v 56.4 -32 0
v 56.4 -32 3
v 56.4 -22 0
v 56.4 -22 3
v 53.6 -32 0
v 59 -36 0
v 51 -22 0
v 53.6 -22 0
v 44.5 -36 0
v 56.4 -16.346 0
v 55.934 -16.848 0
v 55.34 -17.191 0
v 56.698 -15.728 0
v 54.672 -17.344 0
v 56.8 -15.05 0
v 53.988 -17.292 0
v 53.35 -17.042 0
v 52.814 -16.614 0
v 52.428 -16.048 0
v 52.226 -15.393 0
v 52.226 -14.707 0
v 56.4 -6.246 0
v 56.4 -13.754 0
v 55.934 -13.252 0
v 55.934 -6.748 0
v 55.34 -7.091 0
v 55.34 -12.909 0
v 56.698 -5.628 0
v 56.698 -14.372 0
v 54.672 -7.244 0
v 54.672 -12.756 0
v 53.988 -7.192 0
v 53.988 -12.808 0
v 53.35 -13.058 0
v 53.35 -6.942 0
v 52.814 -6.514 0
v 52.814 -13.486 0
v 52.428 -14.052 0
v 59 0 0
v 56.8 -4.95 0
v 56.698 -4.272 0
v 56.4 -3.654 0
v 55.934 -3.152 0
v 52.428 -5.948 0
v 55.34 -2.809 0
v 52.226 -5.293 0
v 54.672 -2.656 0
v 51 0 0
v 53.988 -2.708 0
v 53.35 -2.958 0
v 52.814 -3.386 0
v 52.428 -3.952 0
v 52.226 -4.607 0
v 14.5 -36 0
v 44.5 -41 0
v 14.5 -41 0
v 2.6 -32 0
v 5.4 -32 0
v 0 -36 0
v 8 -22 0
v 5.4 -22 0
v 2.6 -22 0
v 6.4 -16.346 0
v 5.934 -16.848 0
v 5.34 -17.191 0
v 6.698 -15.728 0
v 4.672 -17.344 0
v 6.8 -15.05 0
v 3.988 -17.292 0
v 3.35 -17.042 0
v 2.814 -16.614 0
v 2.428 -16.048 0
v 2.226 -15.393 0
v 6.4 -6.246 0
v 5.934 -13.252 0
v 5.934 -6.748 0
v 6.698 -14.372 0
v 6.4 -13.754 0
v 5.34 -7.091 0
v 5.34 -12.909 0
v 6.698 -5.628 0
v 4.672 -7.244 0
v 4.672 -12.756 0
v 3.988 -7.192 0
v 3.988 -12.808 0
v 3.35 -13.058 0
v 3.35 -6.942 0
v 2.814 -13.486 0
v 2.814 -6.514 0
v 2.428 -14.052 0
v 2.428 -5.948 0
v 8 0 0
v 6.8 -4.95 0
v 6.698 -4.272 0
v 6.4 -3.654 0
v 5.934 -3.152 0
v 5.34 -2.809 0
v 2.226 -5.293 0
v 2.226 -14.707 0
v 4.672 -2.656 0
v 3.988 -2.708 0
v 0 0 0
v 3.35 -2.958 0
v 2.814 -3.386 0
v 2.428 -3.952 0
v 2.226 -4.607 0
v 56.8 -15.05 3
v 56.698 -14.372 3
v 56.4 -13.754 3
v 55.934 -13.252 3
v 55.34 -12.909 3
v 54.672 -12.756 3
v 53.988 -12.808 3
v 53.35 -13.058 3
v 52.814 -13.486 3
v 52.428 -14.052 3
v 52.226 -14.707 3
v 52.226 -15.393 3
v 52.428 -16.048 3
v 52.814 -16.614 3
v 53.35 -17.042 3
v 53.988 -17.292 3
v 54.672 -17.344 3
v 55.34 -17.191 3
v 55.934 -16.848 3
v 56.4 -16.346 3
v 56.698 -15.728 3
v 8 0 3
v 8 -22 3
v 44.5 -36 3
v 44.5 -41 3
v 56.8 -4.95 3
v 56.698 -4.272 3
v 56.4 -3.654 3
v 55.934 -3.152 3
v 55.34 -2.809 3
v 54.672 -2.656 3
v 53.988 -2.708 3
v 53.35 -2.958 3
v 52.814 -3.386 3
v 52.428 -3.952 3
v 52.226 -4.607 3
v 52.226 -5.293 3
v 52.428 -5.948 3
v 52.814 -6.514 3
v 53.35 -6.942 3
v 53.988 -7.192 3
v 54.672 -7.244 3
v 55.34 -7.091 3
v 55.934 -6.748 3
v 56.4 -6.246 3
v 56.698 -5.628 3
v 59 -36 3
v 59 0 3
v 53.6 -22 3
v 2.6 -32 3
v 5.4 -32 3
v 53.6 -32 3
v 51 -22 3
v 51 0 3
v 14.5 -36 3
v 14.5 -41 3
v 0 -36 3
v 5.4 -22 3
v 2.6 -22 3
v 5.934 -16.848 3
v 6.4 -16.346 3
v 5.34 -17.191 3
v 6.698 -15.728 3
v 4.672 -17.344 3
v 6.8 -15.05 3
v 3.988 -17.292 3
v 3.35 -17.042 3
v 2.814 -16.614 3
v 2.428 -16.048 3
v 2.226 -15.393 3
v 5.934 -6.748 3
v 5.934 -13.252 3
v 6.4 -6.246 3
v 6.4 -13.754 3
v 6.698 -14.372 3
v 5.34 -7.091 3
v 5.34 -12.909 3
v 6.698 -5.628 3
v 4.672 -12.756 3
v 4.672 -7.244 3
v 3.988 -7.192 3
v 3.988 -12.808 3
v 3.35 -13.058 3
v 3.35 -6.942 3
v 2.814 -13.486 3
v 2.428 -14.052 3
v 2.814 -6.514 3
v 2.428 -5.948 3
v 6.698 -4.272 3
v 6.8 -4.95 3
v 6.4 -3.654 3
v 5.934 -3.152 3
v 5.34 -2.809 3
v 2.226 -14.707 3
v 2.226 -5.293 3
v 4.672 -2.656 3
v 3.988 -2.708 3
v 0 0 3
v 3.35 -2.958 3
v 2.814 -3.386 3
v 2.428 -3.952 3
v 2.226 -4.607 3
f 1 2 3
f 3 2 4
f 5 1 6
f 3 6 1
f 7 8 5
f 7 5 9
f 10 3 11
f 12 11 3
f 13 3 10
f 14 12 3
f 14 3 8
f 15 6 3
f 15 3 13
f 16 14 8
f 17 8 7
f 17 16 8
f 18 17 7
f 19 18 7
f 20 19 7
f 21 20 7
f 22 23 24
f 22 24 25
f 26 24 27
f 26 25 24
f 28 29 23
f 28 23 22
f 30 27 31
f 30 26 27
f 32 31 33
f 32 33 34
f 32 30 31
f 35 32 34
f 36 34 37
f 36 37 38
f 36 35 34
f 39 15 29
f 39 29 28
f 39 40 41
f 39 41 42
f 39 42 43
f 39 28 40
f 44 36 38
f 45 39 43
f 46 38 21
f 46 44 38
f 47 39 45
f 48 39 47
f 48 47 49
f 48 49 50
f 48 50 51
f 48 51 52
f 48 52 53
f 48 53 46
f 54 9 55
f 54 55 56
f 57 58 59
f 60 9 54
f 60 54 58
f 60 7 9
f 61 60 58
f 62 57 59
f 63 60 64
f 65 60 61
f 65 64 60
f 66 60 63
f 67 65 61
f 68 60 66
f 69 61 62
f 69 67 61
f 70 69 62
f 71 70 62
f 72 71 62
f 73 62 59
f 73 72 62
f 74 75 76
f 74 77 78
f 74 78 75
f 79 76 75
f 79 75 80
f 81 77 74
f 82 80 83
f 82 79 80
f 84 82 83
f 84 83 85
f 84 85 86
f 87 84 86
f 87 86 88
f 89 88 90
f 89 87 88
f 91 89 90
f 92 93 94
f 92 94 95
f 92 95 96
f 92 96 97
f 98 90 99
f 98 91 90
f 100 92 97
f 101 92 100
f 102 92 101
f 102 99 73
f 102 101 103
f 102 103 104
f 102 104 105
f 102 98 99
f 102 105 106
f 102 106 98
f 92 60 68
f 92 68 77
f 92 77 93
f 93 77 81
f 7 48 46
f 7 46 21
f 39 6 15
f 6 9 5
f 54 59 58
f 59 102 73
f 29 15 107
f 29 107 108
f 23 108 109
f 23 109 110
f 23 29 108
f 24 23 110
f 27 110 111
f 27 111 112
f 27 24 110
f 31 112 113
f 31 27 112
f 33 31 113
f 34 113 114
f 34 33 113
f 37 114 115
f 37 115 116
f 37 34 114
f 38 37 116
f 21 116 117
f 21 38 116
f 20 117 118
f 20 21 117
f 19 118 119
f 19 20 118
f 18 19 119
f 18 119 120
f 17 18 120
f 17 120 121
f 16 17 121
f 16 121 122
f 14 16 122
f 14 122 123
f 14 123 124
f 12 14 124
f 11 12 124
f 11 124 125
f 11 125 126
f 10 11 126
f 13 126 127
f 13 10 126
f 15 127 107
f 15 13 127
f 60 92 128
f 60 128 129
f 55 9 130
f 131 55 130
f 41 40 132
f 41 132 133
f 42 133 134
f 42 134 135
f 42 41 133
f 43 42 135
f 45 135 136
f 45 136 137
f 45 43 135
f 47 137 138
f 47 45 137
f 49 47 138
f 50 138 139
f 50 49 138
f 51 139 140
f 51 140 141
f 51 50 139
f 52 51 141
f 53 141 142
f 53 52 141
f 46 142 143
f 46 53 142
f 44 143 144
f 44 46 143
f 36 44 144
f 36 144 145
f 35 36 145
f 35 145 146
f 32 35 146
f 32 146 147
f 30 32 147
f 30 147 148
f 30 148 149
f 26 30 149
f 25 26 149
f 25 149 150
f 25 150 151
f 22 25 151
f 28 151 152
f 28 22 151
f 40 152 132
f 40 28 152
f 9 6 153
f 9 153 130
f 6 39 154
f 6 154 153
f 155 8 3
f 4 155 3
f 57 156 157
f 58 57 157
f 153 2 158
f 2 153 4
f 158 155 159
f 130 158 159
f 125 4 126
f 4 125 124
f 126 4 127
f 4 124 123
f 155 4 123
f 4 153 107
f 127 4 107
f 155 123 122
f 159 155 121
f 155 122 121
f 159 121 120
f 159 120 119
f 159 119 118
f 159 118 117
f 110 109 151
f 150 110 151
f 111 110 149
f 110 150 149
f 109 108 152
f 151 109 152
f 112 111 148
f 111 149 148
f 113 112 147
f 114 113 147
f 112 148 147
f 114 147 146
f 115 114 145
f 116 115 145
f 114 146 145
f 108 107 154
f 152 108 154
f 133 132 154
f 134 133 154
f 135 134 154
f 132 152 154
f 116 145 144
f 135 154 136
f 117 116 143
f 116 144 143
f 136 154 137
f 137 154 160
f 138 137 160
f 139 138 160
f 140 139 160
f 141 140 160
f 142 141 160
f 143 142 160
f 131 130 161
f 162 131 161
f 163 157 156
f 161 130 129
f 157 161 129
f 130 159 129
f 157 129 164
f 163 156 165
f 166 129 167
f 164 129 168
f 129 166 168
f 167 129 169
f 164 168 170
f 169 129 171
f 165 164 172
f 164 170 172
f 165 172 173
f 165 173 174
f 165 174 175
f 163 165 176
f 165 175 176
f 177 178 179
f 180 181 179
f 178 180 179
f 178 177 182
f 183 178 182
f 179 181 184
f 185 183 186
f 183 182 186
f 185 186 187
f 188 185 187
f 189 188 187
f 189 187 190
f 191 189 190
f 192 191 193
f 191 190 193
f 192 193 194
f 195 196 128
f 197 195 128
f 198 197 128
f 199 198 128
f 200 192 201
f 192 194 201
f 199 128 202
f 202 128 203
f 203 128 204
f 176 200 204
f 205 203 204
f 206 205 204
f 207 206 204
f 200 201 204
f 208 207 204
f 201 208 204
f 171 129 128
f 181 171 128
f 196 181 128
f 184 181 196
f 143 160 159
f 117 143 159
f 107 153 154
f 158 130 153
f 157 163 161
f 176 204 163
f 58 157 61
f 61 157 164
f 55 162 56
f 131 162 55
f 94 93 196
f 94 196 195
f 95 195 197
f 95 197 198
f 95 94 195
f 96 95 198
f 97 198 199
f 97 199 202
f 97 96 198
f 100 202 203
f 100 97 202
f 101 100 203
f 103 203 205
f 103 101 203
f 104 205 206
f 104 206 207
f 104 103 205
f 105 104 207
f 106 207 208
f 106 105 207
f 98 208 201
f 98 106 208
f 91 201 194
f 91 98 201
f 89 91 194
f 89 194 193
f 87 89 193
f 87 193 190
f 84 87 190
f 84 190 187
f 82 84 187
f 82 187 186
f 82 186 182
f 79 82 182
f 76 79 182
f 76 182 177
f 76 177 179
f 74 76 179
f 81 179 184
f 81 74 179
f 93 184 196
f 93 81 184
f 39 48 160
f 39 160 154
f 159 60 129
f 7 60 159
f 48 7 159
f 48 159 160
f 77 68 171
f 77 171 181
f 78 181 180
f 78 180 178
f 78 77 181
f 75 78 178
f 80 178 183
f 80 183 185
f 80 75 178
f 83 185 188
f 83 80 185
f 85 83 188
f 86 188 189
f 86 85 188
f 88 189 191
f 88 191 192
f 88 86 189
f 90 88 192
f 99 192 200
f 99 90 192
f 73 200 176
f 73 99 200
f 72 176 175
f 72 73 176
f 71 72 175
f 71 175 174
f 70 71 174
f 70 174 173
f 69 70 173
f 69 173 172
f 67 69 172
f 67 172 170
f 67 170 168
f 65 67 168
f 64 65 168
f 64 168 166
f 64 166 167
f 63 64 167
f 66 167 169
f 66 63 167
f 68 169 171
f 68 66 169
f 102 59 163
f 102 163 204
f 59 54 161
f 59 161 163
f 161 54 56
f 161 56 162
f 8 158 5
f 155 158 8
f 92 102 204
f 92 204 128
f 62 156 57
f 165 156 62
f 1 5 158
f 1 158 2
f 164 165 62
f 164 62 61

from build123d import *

# Parameters (mm, degrees)
SKETCH1_R           = 2.3
BOSS_EXTRUDE1_DEPTH = 3
SKETCH3_W           = 2.8
SKETCH3_H           = 10
CUT_EXTRUDE1_DEPTH  = 10
SKETCH4_W           = 30
SKETCH4_H           = 3
BOSS_EXTRUDE2_DEPTH = 5


with BuildPart() as part:
    # Sketch1 → Boss-Extrude1 (new body)
    with BuildSketch(Plane.XY):
        Polygon((0, 0), (8, 0), (8, -22), (51, -22), (51, 0), (59, 0), (59, -36), (0, -36), align=None)
        with Locations((4.5, -15.05)):
            Circle(SKETCH1_R, mode=Mode.SUBTRACT)
        with Locations((4.5, -4.95)):
            Circle(SKETCH1_R, mode=Mode.SUBTRACT)
        with Locations((54.5, -4.95)):
            Circle(SKETCH1_R, mode=Mode.SUBTRACT)
        with Locations((54.5, -15.05)):
            Circle(SKETCH1_R, mode=Mode.SUBTRACT)
    extrude(amount=BOSS_EXTRUDE1_DEPTH)

    # Sketch3 → Cut-Extrude1 (cut)
    with BuildSketch(Plane.XY.offset(3)):
        with Locations((4, -27)):
            Rectangle(SKETCH3_W, SKETCH3_H)
        with Locations((55, -27)):
            Rectangle(SKETCH3_W, SKETCH3_H)
    extrude(amount=-CUT_EXTRUDE1_DEPTH, mode=Mode.SUBTRACT)

    # Sketch4 → Boss-Extrude2 (add)
    with BuildSketch(Plane.XZ.offset(36)):
        with Locations((29.5, 1.5)):
            Rectangle(SKETCH4_W, SKETCH4_H)
    extrude(amount=BOSS_EXTRUDE2_DEPTH)


solid = part.part
